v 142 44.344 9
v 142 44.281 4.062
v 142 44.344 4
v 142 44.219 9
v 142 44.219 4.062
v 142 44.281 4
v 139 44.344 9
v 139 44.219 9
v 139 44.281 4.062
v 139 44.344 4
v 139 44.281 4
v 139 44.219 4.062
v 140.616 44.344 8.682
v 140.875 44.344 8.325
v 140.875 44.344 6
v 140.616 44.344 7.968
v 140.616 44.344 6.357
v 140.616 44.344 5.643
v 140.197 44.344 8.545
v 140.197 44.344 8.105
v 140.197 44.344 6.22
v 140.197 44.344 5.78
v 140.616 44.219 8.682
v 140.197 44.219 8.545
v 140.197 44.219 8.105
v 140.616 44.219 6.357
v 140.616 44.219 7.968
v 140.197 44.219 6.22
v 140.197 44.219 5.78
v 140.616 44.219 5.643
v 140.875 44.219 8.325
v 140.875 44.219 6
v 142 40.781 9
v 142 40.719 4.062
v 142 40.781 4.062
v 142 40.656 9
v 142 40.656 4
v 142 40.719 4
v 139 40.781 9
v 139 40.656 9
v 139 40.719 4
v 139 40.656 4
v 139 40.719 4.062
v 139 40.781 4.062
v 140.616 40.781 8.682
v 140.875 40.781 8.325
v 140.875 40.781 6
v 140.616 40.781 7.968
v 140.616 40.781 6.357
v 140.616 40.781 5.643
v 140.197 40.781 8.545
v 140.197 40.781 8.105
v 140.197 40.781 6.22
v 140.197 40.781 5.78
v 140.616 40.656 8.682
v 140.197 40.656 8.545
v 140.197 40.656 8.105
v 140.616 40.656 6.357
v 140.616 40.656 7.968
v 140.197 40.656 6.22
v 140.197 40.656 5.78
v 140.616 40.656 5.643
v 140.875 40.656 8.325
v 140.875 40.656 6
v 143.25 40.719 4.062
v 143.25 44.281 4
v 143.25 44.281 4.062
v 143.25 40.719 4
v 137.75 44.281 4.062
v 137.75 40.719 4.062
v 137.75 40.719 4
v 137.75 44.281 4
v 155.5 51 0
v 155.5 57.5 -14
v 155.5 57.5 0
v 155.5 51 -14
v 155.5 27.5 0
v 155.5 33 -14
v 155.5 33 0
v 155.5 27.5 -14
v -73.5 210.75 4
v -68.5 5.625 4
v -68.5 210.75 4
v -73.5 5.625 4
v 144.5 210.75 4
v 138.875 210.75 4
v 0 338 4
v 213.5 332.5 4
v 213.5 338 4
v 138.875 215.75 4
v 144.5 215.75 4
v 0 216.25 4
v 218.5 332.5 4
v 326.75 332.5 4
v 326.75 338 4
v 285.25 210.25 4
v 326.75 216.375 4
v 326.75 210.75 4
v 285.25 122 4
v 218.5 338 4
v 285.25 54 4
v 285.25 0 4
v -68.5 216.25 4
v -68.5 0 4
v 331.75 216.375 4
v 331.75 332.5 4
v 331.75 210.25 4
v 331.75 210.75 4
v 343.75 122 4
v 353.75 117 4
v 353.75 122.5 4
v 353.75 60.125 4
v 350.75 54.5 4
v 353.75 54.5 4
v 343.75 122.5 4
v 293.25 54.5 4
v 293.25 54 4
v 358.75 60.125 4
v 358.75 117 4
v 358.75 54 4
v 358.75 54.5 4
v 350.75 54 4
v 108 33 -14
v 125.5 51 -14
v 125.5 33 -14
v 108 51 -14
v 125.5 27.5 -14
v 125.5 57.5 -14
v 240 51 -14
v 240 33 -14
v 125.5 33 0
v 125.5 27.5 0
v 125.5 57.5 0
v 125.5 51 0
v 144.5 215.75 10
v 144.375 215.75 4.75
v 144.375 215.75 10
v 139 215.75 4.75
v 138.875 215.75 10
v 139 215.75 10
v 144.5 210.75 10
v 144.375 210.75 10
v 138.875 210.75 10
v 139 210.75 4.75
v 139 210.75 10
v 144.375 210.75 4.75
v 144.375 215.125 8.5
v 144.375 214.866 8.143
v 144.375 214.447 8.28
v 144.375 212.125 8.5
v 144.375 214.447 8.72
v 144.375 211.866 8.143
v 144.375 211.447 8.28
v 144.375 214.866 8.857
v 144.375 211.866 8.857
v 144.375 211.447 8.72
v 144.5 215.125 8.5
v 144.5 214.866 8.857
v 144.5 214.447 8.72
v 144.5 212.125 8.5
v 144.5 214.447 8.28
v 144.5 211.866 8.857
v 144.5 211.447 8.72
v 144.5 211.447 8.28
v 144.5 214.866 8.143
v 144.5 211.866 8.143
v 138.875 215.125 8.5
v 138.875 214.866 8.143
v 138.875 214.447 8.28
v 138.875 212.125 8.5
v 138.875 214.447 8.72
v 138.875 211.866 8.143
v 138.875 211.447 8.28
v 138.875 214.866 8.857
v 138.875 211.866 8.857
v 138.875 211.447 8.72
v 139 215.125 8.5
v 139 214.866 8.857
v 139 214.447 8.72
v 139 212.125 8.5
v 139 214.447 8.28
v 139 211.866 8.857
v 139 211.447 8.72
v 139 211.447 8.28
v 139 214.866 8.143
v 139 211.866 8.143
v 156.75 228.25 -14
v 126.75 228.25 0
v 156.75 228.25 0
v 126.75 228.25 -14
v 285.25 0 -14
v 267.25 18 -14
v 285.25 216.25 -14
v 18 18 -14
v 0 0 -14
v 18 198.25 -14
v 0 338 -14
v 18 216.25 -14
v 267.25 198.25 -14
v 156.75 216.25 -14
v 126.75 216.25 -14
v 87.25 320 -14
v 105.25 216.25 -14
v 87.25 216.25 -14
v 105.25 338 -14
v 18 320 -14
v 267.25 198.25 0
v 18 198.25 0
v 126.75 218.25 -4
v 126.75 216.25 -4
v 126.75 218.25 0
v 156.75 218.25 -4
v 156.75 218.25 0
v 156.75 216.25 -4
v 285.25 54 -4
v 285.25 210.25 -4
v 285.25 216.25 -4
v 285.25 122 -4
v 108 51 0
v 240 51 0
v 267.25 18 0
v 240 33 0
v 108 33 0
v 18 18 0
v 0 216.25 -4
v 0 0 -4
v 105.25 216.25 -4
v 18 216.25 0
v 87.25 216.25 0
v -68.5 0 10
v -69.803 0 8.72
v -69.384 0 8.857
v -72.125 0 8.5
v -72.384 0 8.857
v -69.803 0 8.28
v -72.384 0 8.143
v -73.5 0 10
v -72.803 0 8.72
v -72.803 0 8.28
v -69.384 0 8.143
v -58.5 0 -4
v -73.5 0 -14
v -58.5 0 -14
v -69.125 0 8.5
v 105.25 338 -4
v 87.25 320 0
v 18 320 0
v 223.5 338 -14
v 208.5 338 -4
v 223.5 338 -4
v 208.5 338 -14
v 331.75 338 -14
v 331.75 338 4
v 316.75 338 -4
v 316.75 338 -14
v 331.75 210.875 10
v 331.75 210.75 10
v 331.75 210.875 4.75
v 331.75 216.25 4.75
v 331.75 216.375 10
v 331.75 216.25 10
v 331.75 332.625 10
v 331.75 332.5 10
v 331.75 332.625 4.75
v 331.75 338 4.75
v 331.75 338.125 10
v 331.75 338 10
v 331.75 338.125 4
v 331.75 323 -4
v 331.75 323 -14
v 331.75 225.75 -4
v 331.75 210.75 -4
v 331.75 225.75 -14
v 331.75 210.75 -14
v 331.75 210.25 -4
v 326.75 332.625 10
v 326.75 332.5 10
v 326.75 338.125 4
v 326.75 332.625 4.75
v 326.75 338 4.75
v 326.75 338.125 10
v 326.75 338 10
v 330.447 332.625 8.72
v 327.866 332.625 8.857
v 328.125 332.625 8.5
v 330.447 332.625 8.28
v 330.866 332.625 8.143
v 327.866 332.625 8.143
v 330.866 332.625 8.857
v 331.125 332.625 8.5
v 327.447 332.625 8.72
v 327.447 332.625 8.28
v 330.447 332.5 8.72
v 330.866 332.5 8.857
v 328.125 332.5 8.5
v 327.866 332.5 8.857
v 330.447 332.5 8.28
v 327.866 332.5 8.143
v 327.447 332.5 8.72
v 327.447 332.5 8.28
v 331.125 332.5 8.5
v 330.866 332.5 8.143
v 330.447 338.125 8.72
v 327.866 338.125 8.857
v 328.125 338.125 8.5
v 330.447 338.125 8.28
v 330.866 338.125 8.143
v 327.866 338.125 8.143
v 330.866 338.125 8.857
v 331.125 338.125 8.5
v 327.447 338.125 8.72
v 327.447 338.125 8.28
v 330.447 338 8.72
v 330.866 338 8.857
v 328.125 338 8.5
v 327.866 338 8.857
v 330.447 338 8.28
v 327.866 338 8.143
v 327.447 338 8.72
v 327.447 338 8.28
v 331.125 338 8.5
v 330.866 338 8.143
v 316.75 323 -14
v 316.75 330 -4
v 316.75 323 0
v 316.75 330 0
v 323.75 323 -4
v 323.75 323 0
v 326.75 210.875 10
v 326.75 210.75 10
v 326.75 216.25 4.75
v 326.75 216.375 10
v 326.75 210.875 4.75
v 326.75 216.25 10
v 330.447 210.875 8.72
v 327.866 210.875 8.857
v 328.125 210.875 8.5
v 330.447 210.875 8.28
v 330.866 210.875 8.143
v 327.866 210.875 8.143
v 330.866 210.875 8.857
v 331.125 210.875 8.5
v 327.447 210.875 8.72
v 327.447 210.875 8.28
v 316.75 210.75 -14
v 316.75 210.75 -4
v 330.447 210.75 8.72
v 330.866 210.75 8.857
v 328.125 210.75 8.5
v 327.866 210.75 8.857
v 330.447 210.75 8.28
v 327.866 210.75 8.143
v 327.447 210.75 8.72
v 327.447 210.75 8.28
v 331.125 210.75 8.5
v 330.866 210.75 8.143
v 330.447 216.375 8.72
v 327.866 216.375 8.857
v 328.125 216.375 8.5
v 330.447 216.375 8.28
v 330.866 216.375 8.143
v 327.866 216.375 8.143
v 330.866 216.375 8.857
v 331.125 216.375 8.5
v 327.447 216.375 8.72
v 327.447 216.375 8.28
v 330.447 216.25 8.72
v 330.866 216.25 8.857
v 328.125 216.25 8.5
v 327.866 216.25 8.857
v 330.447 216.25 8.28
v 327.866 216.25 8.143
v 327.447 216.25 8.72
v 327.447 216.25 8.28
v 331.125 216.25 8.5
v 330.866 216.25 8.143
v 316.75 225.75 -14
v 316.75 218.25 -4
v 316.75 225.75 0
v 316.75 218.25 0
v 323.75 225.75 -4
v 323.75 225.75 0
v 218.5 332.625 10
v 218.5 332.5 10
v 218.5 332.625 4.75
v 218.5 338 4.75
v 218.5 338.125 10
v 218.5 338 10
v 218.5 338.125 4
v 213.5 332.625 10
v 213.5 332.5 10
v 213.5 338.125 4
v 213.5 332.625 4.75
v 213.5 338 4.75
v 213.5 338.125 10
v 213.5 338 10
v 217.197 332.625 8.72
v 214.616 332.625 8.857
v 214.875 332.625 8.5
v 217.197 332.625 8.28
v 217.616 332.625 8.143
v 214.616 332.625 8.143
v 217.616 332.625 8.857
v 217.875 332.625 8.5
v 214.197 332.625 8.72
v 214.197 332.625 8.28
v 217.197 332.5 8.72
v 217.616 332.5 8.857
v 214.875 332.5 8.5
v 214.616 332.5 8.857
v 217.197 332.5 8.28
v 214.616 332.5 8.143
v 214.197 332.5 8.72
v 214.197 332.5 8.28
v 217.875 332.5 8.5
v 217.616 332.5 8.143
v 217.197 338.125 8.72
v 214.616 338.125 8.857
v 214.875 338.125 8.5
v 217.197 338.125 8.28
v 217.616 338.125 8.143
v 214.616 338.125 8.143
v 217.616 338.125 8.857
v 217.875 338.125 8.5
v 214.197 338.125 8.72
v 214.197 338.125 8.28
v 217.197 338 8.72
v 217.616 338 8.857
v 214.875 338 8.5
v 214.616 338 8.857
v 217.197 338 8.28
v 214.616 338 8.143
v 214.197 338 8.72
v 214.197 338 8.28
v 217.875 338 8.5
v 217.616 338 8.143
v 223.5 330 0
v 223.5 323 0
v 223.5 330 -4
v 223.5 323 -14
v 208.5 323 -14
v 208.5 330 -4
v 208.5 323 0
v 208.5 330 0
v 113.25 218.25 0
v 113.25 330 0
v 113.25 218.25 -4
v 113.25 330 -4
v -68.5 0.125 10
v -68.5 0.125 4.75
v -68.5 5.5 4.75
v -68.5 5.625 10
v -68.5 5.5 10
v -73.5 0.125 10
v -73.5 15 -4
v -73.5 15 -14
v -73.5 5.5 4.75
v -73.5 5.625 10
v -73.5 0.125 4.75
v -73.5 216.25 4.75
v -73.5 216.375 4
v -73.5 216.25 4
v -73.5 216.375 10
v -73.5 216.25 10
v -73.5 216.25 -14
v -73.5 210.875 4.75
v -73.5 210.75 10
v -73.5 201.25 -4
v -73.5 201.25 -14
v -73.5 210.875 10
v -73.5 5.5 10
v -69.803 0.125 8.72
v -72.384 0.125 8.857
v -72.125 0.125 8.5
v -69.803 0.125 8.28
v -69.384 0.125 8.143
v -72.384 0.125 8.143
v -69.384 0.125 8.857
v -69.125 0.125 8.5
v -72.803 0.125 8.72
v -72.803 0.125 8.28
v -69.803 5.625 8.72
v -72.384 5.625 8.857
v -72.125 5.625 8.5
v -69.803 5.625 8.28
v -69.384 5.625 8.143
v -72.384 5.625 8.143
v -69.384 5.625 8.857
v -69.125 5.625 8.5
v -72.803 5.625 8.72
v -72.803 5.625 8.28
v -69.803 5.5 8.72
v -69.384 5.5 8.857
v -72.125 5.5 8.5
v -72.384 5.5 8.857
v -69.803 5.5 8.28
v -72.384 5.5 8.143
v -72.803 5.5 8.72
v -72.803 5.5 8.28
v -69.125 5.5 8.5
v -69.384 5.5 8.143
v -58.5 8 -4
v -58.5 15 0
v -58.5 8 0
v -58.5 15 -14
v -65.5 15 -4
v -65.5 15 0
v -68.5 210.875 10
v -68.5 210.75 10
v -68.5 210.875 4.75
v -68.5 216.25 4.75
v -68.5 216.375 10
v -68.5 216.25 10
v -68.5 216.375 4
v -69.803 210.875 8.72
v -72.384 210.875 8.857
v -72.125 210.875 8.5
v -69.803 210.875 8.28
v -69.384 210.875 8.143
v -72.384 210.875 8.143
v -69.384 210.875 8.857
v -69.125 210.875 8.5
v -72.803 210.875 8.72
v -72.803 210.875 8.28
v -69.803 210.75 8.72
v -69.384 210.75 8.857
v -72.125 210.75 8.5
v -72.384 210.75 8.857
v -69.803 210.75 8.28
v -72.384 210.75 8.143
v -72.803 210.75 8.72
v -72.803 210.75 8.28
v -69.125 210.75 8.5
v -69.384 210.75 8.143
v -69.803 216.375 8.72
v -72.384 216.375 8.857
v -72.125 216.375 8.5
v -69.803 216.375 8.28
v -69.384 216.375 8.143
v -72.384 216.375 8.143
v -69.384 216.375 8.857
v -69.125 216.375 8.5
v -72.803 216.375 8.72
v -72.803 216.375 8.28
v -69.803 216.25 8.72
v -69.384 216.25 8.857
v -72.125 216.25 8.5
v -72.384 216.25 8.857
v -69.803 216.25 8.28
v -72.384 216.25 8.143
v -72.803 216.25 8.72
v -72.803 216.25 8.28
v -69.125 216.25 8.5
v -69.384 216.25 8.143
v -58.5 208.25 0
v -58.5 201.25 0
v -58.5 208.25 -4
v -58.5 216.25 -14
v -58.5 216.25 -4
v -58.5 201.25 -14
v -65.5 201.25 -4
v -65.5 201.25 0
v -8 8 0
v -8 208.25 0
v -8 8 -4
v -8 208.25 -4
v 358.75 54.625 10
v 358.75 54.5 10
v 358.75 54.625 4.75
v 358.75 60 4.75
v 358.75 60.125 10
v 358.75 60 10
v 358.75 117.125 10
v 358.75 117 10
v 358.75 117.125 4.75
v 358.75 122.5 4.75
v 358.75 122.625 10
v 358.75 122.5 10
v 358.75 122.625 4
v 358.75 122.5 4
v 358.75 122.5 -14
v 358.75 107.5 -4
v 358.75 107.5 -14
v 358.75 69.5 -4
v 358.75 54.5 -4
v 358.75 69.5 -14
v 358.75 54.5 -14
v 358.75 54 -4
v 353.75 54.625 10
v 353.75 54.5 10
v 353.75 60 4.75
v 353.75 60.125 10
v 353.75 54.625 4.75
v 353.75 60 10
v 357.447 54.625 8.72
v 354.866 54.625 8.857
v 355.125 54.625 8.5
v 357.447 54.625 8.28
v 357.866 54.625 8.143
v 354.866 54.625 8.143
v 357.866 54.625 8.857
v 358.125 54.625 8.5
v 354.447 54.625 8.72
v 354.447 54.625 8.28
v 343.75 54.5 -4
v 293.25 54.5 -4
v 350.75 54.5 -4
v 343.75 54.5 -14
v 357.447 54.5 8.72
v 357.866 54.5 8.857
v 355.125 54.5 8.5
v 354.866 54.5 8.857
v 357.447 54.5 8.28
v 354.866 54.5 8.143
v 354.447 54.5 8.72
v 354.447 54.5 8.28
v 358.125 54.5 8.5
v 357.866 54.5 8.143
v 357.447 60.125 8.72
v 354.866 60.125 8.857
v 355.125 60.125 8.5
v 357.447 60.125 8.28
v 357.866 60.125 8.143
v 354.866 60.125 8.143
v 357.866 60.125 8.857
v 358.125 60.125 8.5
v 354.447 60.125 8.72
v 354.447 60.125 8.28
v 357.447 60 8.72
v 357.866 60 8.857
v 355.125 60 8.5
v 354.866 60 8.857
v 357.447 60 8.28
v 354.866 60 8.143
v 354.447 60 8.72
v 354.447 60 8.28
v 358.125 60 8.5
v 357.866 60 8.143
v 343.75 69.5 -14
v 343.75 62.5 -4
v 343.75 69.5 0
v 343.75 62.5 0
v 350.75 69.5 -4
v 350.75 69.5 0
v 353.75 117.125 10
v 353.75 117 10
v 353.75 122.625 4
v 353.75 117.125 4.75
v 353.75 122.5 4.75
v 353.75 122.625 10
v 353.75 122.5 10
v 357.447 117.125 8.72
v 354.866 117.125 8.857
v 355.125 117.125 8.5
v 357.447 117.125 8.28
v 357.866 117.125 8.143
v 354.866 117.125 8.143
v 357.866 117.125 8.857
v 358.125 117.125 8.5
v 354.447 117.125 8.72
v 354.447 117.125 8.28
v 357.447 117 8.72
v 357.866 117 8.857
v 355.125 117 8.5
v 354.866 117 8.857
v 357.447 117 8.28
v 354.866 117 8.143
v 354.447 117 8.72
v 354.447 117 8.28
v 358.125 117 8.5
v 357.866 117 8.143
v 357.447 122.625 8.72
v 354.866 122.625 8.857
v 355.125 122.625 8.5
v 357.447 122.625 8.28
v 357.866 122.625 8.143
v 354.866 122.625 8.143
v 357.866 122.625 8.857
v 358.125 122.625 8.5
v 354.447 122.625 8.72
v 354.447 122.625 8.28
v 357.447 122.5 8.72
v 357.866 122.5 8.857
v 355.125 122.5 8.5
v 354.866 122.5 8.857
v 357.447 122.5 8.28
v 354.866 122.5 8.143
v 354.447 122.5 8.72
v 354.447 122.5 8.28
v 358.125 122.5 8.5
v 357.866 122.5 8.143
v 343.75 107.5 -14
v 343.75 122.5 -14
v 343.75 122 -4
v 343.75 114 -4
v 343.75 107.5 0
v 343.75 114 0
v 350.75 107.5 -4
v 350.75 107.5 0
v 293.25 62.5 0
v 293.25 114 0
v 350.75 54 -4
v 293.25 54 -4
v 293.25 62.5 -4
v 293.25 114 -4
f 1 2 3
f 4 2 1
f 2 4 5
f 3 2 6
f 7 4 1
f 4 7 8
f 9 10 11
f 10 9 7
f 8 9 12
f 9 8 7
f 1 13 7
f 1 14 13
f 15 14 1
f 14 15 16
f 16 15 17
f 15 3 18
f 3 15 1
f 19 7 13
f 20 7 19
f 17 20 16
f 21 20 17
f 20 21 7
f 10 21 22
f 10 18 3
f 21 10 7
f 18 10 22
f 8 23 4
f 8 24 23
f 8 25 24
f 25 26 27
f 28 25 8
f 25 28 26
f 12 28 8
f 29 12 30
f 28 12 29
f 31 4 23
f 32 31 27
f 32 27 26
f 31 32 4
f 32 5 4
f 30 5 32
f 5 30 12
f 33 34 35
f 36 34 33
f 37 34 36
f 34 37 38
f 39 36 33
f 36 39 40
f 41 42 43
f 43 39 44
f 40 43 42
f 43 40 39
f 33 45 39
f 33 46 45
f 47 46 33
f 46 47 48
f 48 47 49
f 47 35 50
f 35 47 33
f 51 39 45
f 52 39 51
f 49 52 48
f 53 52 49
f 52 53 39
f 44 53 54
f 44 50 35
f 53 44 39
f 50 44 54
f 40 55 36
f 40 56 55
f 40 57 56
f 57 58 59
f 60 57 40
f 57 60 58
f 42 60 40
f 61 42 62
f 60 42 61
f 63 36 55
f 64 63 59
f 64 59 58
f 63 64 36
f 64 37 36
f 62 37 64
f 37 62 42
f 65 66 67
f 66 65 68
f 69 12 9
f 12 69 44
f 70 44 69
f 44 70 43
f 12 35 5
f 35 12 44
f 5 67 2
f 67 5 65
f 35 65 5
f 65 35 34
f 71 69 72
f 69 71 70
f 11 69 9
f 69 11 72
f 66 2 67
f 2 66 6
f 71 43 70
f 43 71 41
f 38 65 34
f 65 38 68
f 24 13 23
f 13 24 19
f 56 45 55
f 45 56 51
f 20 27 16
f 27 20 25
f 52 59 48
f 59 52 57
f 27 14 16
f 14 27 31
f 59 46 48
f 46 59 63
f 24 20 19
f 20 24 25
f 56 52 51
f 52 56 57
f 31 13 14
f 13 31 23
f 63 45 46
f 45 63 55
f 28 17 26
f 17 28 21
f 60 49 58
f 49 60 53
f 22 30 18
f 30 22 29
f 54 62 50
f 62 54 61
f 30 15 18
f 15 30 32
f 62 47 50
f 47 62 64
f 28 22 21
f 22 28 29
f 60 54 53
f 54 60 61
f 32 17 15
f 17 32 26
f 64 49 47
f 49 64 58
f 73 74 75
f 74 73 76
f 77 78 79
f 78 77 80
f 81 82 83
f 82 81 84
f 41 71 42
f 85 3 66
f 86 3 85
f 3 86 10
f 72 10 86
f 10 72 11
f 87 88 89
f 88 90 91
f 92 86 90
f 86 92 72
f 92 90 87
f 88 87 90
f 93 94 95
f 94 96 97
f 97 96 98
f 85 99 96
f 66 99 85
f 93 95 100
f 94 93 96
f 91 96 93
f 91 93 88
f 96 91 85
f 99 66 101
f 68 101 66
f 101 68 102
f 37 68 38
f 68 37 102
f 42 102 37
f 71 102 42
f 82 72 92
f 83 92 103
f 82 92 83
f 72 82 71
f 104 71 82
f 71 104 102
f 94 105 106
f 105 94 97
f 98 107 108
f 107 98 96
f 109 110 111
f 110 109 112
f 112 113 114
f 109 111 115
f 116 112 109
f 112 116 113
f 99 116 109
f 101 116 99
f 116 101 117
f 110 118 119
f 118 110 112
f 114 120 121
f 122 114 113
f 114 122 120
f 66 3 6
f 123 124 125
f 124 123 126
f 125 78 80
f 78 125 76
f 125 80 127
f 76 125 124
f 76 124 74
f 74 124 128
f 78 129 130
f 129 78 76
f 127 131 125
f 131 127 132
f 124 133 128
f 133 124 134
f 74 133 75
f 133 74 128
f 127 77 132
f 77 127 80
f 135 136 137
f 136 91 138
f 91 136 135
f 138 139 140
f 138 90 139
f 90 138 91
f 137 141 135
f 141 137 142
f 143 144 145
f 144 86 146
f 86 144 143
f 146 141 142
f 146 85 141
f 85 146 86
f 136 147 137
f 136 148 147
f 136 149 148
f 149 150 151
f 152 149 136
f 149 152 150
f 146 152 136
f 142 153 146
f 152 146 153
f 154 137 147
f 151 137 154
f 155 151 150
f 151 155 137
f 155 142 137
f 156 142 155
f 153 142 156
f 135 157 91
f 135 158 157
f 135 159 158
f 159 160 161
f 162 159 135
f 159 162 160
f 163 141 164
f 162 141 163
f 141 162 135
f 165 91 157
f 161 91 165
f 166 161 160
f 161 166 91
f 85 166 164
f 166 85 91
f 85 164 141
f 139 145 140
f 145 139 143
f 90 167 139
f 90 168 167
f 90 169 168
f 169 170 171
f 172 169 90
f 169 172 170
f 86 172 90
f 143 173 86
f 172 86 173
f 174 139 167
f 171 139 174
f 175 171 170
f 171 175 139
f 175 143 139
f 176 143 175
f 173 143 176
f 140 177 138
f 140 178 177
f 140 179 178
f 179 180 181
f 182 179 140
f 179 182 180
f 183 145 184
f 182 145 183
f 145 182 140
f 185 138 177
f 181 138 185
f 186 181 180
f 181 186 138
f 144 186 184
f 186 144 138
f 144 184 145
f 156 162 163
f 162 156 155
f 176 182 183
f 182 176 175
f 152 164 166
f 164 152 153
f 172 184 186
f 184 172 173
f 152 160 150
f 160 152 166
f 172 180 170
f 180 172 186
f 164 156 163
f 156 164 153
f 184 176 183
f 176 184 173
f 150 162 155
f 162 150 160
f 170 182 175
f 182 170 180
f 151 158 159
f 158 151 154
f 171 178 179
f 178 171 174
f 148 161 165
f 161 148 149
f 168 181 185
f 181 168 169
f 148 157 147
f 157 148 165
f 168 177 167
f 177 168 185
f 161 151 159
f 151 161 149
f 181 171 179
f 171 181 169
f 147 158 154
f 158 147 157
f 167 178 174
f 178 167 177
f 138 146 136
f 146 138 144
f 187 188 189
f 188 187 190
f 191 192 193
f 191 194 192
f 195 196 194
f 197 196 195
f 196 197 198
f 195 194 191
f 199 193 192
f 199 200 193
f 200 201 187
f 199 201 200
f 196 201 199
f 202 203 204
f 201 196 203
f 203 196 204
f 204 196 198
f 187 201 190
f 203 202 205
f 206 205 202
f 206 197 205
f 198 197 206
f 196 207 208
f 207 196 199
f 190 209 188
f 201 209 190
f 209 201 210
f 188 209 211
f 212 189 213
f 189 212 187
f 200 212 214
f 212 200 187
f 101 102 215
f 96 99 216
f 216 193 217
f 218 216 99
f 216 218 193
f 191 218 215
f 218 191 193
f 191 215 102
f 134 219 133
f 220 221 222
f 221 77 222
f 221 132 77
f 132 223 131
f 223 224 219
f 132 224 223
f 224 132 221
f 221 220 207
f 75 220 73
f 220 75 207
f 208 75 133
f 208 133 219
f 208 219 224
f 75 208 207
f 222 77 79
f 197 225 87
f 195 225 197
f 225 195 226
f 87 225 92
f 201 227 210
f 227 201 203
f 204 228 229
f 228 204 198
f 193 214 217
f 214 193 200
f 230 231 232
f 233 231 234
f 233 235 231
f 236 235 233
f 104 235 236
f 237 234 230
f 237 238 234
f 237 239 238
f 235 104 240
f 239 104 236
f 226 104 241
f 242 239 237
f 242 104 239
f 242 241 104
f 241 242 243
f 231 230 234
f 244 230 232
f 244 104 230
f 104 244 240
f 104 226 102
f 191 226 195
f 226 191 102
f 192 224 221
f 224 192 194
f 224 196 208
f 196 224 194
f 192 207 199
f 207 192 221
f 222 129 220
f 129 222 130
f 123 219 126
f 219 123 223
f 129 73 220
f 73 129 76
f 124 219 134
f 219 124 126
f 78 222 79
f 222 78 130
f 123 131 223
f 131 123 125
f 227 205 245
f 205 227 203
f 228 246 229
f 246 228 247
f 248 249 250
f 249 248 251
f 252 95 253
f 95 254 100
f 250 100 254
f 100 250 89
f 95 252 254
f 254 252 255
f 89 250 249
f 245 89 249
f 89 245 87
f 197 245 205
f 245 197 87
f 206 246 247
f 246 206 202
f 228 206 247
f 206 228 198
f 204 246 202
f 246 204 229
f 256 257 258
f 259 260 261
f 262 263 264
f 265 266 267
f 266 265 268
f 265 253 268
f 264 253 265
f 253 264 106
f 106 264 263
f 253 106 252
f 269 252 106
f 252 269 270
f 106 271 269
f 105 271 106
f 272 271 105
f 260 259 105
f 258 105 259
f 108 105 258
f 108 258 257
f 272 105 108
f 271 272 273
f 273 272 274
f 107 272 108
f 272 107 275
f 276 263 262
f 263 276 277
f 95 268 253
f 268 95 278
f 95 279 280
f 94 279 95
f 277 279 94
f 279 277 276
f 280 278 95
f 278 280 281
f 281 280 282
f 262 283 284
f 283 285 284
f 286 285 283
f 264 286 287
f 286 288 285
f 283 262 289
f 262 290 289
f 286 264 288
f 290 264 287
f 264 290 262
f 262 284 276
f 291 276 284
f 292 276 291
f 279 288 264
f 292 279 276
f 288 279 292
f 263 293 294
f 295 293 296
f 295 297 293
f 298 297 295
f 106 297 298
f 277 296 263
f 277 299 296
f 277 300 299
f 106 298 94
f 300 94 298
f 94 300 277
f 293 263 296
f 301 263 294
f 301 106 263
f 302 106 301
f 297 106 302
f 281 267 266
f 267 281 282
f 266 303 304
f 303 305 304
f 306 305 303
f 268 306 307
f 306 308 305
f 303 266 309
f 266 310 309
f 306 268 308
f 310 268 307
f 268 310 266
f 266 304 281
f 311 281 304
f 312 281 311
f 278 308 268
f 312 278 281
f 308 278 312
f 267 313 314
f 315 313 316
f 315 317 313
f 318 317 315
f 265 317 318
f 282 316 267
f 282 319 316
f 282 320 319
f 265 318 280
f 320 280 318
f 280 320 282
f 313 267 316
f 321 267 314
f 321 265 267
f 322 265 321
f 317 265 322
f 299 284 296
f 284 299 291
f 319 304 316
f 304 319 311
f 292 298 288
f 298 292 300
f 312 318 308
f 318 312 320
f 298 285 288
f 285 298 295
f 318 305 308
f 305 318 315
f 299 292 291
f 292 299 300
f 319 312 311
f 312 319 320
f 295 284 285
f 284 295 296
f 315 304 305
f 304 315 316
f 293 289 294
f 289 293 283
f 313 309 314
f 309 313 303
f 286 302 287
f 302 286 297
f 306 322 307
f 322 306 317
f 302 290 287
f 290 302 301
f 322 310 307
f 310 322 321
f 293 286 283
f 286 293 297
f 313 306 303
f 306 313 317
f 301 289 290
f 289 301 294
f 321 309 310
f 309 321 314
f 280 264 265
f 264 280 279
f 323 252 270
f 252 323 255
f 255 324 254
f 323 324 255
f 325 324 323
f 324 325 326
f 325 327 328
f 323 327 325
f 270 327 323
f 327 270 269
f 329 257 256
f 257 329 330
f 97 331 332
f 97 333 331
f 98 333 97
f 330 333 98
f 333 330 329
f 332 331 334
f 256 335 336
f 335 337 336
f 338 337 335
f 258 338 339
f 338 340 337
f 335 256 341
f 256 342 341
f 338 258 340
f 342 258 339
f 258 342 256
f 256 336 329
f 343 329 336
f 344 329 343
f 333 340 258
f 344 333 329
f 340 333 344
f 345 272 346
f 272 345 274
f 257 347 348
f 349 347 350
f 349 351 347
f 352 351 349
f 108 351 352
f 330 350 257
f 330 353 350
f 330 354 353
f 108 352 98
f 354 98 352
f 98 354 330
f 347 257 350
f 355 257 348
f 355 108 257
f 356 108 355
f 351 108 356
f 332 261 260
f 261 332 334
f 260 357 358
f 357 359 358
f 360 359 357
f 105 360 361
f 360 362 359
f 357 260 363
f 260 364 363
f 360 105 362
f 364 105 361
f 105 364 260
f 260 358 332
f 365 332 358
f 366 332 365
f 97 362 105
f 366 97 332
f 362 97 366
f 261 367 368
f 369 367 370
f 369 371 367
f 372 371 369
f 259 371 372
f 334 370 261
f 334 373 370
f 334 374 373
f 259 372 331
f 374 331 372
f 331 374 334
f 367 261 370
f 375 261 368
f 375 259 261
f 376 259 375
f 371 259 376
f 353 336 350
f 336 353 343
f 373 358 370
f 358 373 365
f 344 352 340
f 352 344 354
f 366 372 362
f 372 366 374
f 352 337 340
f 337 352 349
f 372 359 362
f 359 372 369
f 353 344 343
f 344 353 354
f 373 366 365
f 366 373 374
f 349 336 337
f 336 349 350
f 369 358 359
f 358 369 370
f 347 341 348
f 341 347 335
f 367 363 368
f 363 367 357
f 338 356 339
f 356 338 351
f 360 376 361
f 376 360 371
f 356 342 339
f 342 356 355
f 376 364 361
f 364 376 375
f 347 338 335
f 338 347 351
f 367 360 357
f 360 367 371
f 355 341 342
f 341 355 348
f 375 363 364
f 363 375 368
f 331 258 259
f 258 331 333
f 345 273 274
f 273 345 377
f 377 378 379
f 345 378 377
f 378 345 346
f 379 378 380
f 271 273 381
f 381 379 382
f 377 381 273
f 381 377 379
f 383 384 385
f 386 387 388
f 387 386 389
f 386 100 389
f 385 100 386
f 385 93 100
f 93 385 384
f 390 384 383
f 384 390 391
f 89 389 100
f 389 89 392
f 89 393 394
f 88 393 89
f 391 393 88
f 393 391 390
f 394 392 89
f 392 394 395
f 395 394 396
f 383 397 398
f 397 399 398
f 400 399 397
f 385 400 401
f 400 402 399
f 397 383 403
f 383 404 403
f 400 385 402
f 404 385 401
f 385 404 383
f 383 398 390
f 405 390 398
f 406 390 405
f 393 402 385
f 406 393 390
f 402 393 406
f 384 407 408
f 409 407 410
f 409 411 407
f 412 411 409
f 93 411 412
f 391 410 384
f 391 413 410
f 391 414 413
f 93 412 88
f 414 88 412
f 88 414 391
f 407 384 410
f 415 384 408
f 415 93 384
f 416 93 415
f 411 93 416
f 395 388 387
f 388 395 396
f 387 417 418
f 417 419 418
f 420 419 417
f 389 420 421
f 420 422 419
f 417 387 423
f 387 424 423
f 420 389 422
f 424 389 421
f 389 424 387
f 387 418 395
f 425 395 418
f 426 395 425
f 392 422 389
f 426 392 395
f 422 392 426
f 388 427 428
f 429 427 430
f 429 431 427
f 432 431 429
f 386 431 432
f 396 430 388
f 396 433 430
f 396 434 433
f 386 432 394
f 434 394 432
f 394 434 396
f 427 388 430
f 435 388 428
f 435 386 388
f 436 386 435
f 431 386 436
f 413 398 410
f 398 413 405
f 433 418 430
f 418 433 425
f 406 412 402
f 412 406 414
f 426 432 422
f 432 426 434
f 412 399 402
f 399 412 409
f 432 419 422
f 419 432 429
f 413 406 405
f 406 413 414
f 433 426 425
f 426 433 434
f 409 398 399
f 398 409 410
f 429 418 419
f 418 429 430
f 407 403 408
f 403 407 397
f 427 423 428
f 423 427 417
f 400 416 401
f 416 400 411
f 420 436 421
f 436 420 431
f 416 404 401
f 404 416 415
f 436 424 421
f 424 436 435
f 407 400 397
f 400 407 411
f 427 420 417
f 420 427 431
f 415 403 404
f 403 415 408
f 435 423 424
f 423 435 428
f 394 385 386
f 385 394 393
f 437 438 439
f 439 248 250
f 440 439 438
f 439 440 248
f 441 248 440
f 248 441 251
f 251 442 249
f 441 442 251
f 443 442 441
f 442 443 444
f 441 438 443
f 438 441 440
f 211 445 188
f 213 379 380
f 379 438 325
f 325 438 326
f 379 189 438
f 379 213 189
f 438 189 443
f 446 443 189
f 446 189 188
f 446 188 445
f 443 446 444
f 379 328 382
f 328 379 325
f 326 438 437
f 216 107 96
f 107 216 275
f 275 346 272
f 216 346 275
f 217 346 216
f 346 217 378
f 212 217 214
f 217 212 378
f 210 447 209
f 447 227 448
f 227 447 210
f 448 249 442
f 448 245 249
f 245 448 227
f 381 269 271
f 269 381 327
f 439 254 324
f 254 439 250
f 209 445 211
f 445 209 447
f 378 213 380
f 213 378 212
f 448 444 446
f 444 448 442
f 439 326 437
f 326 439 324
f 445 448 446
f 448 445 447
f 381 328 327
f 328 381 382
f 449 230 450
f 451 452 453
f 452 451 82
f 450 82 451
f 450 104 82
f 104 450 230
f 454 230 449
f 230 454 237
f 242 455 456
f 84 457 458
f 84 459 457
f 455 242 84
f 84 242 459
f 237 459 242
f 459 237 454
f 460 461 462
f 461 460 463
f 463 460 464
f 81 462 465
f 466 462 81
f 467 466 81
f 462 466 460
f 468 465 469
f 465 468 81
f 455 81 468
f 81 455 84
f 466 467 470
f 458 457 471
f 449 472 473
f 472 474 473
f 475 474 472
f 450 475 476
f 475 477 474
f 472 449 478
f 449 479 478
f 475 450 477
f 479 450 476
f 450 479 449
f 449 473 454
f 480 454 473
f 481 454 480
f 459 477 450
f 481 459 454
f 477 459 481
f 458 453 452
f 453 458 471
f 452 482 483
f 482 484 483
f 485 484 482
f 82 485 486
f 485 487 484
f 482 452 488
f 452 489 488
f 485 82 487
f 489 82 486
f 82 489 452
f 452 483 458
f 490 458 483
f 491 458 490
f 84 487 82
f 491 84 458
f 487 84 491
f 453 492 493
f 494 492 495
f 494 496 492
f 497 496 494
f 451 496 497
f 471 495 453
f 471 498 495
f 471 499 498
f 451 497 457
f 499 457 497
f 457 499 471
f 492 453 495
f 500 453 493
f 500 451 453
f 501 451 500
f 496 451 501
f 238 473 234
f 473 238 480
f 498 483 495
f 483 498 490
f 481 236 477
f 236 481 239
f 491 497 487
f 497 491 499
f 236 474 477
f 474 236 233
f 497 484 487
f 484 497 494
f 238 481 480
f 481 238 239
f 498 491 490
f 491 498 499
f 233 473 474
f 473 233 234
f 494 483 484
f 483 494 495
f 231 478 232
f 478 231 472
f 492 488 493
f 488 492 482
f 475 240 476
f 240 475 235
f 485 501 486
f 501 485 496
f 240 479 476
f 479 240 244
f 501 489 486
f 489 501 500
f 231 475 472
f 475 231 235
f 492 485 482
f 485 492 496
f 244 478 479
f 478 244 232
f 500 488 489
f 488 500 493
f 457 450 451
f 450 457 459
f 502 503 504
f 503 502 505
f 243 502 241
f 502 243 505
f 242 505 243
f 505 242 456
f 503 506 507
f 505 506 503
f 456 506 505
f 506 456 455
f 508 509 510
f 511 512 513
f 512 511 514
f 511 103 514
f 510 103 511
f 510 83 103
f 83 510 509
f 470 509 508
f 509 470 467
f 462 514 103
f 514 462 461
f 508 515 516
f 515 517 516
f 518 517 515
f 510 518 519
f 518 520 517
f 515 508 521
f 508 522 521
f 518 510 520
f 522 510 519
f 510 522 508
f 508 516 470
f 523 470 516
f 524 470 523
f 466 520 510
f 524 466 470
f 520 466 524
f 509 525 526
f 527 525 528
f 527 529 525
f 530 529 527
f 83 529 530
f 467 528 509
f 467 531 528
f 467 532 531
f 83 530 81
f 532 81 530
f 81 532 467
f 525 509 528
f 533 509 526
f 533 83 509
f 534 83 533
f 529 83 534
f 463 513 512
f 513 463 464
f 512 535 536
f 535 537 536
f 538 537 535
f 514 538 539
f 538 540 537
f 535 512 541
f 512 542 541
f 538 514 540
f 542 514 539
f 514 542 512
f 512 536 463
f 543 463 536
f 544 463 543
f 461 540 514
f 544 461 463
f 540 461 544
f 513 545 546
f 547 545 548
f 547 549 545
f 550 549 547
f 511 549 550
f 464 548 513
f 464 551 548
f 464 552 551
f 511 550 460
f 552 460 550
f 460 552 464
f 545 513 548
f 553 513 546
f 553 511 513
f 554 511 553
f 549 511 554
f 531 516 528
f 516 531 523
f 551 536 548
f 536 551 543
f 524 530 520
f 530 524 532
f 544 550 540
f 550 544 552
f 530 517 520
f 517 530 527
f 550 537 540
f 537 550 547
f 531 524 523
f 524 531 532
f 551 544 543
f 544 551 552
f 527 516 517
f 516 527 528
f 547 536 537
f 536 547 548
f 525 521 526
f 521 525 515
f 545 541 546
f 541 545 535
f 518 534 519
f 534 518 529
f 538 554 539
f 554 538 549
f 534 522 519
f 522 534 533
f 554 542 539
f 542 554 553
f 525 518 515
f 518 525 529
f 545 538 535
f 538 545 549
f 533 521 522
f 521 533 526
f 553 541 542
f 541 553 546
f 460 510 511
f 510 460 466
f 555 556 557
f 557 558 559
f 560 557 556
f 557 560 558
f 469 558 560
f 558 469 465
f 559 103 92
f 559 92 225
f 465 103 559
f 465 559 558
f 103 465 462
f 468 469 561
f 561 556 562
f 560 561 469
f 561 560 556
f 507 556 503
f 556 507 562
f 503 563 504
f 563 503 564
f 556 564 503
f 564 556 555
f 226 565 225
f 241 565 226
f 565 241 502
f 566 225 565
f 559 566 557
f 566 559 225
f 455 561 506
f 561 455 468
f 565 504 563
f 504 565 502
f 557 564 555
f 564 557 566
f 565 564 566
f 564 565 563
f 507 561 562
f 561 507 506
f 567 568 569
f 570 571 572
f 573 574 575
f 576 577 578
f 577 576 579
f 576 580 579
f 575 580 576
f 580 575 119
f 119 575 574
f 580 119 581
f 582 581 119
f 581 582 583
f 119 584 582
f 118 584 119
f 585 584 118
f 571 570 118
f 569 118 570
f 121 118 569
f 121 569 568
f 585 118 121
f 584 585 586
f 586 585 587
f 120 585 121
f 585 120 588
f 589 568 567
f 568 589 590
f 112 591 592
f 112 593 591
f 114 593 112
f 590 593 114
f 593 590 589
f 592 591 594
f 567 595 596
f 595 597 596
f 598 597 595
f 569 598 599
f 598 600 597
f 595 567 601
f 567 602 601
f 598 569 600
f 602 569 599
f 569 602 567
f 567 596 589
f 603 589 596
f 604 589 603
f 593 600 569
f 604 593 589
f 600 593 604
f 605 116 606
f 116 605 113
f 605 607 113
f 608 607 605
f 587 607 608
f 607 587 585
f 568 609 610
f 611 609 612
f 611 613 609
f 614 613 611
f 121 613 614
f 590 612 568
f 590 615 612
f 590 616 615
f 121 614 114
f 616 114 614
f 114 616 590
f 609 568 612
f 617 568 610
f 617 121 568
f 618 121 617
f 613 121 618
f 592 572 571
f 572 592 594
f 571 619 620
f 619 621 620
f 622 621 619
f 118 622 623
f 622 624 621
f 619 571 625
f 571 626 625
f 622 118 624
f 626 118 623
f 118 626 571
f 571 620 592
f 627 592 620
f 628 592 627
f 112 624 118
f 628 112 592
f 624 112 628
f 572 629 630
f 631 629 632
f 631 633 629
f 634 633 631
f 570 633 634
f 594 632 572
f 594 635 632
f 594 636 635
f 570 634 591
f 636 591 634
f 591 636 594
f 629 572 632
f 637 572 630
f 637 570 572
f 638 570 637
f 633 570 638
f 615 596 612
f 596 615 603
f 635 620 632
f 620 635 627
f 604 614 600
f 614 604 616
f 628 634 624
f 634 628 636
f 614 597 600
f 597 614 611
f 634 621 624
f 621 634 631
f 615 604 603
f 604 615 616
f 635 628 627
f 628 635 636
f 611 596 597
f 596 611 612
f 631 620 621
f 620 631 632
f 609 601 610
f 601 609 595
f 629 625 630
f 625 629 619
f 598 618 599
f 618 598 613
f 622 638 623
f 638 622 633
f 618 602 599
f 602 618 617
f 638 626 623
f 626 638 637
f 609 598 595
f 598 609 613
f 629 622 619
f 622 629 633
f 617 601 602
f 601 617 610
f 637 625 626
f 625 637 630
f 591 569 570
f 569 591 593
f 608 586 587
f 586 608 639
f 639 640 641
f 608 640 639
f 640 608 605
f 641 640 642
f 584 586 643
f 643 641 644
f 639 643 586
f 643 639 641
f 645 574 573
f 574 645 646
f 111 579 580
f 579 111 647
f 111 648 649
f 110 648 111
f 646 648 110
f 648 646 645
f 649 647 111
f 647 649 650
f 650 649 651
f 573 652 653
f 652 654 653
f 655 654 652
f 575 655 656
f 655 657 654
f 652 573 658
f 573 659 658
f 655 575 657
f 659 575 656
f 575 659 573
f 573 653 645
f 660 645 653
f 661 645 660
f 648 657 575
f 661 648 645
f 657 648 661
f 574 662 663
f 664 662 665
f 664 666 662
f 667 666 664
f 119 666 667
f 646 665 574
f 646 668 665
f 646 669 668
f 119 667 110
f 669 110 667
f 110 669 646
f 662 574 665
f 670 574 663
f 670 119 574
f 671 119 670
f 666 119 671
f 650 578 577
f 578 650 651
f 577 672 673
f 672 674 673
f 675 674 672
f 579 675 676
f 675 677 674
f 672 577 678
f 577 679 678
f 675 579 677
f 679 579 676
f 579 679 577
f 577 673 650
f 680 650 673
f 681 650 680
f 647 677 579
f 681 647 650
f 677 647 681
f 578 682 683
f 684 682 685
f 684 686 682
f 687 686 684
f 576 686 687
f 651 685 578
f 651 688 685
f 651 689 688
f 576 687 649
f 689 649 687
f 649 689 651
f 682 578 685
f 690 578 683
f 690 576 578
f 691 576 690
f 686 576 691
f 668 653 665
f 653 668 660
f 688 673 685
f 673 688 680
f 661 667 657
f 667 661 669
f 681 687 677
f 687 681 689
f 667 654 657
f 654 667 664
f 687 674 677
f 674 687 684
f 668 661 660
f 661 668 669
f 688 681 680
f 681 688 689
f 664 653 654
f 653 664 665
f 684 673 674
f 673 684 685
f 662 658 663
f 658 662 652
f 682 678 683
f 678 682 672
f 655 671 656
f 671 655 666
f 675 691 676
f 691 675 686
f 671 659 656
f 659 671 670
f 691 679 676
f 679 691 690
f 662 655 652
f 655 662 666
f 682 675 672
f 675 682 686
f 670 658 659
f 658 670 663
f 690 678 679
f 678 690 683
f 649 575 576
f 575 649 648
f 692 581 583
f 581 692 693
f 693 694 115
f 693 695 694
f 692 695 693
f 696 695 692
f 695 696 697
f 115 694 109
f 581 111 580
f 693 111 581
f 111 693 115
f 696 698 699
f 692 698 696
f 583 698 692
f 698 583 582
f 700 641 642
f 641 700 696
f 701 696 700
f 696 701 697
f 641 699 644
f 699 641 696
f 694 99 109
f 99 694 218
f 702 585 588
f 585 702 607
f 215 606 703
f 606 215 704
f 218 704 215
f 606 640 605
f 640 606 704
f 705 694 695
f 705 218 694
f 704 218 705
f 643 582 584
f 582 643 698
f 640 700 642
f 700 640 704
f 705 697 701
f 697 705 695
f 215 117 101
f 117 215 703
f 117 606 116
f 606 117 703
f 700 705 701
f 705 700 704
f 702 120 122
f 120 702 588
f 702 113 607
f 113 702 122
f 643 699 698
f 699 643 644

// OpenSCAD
// file: foundation.scad
function ft(d) = 12.0*d ;

// Southeast is 0,0,0
slab_north = ft(23)+9+0.25;
slab_west = ft(18)+0.25;
slab_thk = 4;

g_slab_north = ft(8)+9+0.25;
g_slab_west = ft(10)+1+.75;

d_slab_north = ft(18)+10+.5;
d_slab_west = ft(10)+7+0.75;

p_slab_north = ft(6)+1+0.5;
p_slab_west = ft(18)+0.25;

dr_slab_north = ft(6)+1+0.5;
dr_slab_west = ft(5)+7+0.5;

ex_footer_width=ft(1)+6;

toe_down_width=8;

MAIN_SLAB=[slab_north,slab_west,slab_thk];

module concrete(){
  color([0.5,0.5,0.5]) children();
}
module black_steel(){
   color([0,0,0]) children();
}

module APVB66() {
  black_steel()
    union(){
    cube([5,5.5,0.75]);
    difference(){
      union() {
        cube([5,0.125,6]);
        translate([0,5.5,0])
          cube([5,0.125,6]);
      }
      union(){
        translate([1.0,-3,4.5])
          rotate([-90,0,0])
          cylinder(d=0.75,h=10);
        translate([4,-3,4.5])
          rotate([-90,0,0])
          cylinder(d=0.75,h=10);
      }
    }
  }
}
module CB46(){
  black_steel()
    difference(){
    union(){
      translate([0,(3+9/16)/2,0])
        cube([3,0.125,10],center=true);
      translate([0,-(3+9/16)/2,0])
        cube([3,0.125,10],center=true);
      cube([5.5,3+9/16,0.125],center=true);
    }
    union(){
      translate([0,-4,4.325])
        rotate([-90,0,0])
        cylinder(d=0.75,h=10);
      translate([0,-4,2])
        rotate([-90,0,0])
      cylinder(d=0.75,h=10);
    }
  }
}

module j_bolt(){
  color([1,0,0])
    cylinder(d=5/8,h=8,center=true);
}

module wood_column_footing(position){
  depth=18;
  dim=ft(2)+6;
  if(position == 0){
    APVB66();
    concrete()
      translate([-dim/2+5/2,-dim/2+5.5/2,-depth])
      cube([dim,dim,depth]);
  }
  if(position == 1200){
    APVB66();
    concrete()
      translate([-dim/2+5,-dim/4+5.5/2,-depth])
      cube([dim/2,dim/2,depth]);
  }
  if(position == 130){
    APVB66();
    concrete()
      translate([-dim/2+5,0,-depth])
      cube([dim/2,dim/2,depth]);
  }
  if(position == 300){
    APVB66();
    concrete()
      translate([-dim/4+5/2,0,-depth])
      cube([dim/2,dim/2,depth]);
  }
  if(position == 430){
    APVB66();
    concrete()
      translate([0,0,-depth])
      cube([dim/2,dim/2,depth]);
  }
  if(position == 600){
    APVB66();
    concrete()
      translate([0,-dim/4+5.5/2,-depth])
      cube([dim/2,dim/2,depth]);
  }
  if(position == 730){
    APVB66();
    concrete()
      translate([0,-dim/2+5.5,-depth])
      cube([dim/2,dim/2,depth]);
  }
  if(position == 900){
    APVB66();
    concrete()
      translate([-dim/4+5/2,-dim/2+5.5,-depth])
      cube([dim/2,dim/2,depth]);
  }
  if(position == 1030){
    APVB66();
    concrete()
      translate([-dim/4-5/2,-dim/2+5.5,-depth])
      cube([dim/2,dim/2,depth]);
  }
}

module interior_wood_post_footing(){
  translate([0,0,-9])
    concrete()
    cube([ft(2)+6,ft(2)+6,18],center=true);
  CB46();
}

module interior_wall_footing(length,rotation){
  depth=18;
  if(rotation==0) {
    concrete()
      translate([0,0,-depth+slab_thk])
      cube([length,ft(1)+6,depth]);
  } else {
    concrete()
      translate([ft(1)+6,0,-depth+slab_thk])
      rotate([0,0,90])
      cube([length,ft(2)+6,depth]);
  }
}
module exterior_footing(length,rotation){
  depth=18;
  if(rotation==0) {
    concrete()
    translate([0,0,-depth+slab_thk])
      cube([length,ex_footer_width,depth]);
  } else {
    concrete()
    translate([ex_footer_width,0,-depth+slab_thk])
      rotate([0,0,90])
      cube([length,ex_footer_width,depth]);    
  }
}

module toedown_footing(length,rotation){
  depth=toe_down_width;
  if(rotation==0) {
    concrete()
    translate([0,0,-depth+slab_thk])
      cube([length,depth,depth]);
  } else {
    concrete()
      translate([depth,0,-depth+slab_thk])
      rotate([0,0,90])
      cube([length,depth,depth]);    
  }
}

module X(){
  translate([0,0,0]) children();
}
module NW(){
  X()
    translate([slab_north,slab_west,0]) children();
}
module SW(){
  X()
    translate([0,slab_west,0]) children();
}
module SE(){
  X()
    translate([0,0,0]) children();
}
module NE(){
  X()
    translate([slab_north,0,0]) children();
}
// =====================================================
module main_slab() {
  X()
    concrete()
    cube( MAIN_SLAB );

  exterior_footing(slab_north,0);
  exterior_footing(slab_west,1);
  
  SW()
    translate([0,-ex_footer_width,0])
    exterior_footing(slab_north,0);
  
  NE()
    translate([-ex_footer_width,0,0])
    exterior_footing(slab_west,1);
  
  translate([ft(9), ft(2)+9,0])
    interior_wall_footing(ft(11), 0);


  translate([ft(11)+8+0.5, ft(3)+6+0.5,slab_thk])
    interior_wood_post_footing();
  SW()    
    translate([ft(11)+12+0.5,-5.5,slab_thk])
    rotate([0,0,90])
    wood_column_footing(0);

}
module guest_slab() {
  SW()
    concrete()
    cube( [g_slab_north, g_slab_west,slab_thk]);

   SW()
    translate([0,g_slab_west-ex_footer_width,0])
    exterior_footing(g_slab_north,0);

  SW()
    exterior_footing(g_slab_north,1);

  SW()
    translate([g_slab_north-ex_footer_width,0,0])
    exterior_footing(g_slab_north,1);

}
module drive_slab() {
  SW()
    concrete()
    translate([g_slab_north,g_slab_west-d_slab_west,0])
  cube( [ d_slab_north,d_slab_west,slab_thk ] );

  SW()
    translate([g_slab_north,g_slab_west-d_slab_west,0])
    toedown_footing(d_slab_north,0);
   SW()
     translate([g_slab_north,
                g_slab_west-d_slab_west+d_slab_west-toe_down_width,0])
     toedown_footing(d_slab_north,0);
  SW()
    translate([g_slab_north,g_slab_west-d_slab_west,0])
    toedown_footing(d_slab_west,1);
  SW()
    translate([g_slab_north+d_slab_north-toe_down_width,
               g_slab_west-d_slab_west,0])
    toedown_footing(d_slab_west,1);

  SW()
    translate([g_slab_north+d_slab_north-5,
               g_slab_west-5.5,slab_thk])
    wood_column_footing(1030);

  SW()
    translate([g_slab_north+d_slab_north-5,
               -5.5,slab_thk])
    wood_column_footing(130);

  SW()
    translate([g_slab_north+d_slab_north/2-5,
               g_slab_west-5.5,slab_thk])
    wood_column_footing(900);

}
module porch_slab(){
  SE()
    concrete()
    translate([-p_slab_north,0,0])
  cube([p_slab_north,p_slab_west,slab_thk]);

  translate([-p_slab_north,0,0])
    toedown_footing(p_slab_north,0);
  translate([-p_slab_north,p_slab_west-toe_down_width])
    toedown_footing(p_slab_north,0);

  translate([-toe_down_width,0,0])
    toedown_footing(p_slab_west,1);

  translate([-p_slab_north,0,0])
    toedown_footing(p_slab_west,1);

  SE()
    translate([-p_slab_north,0,slab_thk])
    wood_column_footing(430);  
  SE()
    translate([-p_slab_north,p_slab_west-5.5,slab_thk])
    wood_column_footing(730);  
  
}

module door_slab(){
  NE()
    concrete()
    translate([0,ft(4)+6+0.5,0])
    cube([dr_slab_north,dr_slab_west,slab_thk]);
  NE()
    translate([0,ft(4)+6+0.5,0])
    toedown_footing(dr_slab_north,0);
  NE()
    translate([0,ft(4)+6+0.5+dr_slab_west-toe_down_width,0])
    toedown_footing(dr_slab_north,0);

  NE()
    translate([0,ft(4)+6+0.0,0])
    toedown_footing(dr_slab_west,1);

  NE()
    translate([dr_slab_north-toe_down_width,ft(4)+6+0.0,0])
    toedown_footing(dr_slab_west,1);

  NE()
    translate([dr_slab_north-5,ft(4)+6+0.5,slab_thk])
    wood_column_footing(130);
  NE()
    translate([dr_slab_north-5,ft(4)+6+0.5+dr_slab_west-5,slab_thk])
    wood_column_footing(1030);  
}

module interior_slab() {
  main_slab();
  guest_slab();
}

interior_slab();
drive_slab();
porch_slab();
door_slab();
// main file
include <foundation.scad>


HORIZONTAL_NORTH=0;
HORIZONTAL_WEST=1;
VERTICAL_NORTH=2;
VERTICAL_WEST=3;

module tji_rim_board(length,orientation){

  w=1.5;
  h=11+7/8;
  
  if( orientation == HORIZONTAL_NORTH ){
    translate([0,0,slab_thk])
      versa_lam()
      cube([length,w,h]);
  }
  if( orientation == HORIZONTAL_WEST ){
    translate([w,0,slab_thk])
      rotate([0,0,90])
      versa_lam()
      cube([length,w,h]);
  }
  if( orientation == VERTICAL_NORTH ){
    translate([0,0,slab_thk+thk])
      rotate([0,-90,0])
      versa_lam()
        cube([length,w,h]);
  }
  if( orientation == VERTICAL_WEST ){
    translate([0,0,slab_thk])
      rotate([0,-90,-90])
      versa_lam()
        cube([length,w,h]);
  }
  
}


module TJI_230(length, orientation){
  web=3/8;
  height=11+7/8;
 
  w=2+5/16;
  h=1+3/8;
  
  if( orientation == HORIZONTAL_NORTH ){
    translate([0,0,slab_thk])
    union(){
      cube([length,w,h]);
      translate([0,w/2,0])
        cube([length,web,height]);
      translate([0,0,height-h])
        cube([length,w,h]);
    }
  }
  if( orientation == HORIZONTAL_WEST ){
      translate([w,0,slab_thk])
        rotate([0,0,90])
    union(){
      cube([length,w,h]);
      translate([0,w/2,0])
        cube([length,web,height]);
      translate([0,0,height-h])
        cube([length,w,h]);
    }
  }
}

module TJI_560(length, orientation){
  web=3/8;
  height=11+7/8;
 
  w=2+5/16;
  h=1+3/8;

  if( orientation == HORIZONTAL_NORTH ){
    translate([0,0,slab_thk])
    union(){
      cube([length,w,h]);
      translate([0,w/2,0])
        cube([length,web,height]);
      translate([0,0,height-h])
        cube([length,w,h]);
    }
  }
  if( orientation == HORIZONTAL_WEST ){
      translate([w,0,slab_thk])
        rotate([0,0,90])
    union(){
      cube([length,w,h]);
      translate([0,w/2,0])
        cube([length,web,height]);
      translate([0,0,height-h])
        cube([length,w,h]);
    }
  }
}
